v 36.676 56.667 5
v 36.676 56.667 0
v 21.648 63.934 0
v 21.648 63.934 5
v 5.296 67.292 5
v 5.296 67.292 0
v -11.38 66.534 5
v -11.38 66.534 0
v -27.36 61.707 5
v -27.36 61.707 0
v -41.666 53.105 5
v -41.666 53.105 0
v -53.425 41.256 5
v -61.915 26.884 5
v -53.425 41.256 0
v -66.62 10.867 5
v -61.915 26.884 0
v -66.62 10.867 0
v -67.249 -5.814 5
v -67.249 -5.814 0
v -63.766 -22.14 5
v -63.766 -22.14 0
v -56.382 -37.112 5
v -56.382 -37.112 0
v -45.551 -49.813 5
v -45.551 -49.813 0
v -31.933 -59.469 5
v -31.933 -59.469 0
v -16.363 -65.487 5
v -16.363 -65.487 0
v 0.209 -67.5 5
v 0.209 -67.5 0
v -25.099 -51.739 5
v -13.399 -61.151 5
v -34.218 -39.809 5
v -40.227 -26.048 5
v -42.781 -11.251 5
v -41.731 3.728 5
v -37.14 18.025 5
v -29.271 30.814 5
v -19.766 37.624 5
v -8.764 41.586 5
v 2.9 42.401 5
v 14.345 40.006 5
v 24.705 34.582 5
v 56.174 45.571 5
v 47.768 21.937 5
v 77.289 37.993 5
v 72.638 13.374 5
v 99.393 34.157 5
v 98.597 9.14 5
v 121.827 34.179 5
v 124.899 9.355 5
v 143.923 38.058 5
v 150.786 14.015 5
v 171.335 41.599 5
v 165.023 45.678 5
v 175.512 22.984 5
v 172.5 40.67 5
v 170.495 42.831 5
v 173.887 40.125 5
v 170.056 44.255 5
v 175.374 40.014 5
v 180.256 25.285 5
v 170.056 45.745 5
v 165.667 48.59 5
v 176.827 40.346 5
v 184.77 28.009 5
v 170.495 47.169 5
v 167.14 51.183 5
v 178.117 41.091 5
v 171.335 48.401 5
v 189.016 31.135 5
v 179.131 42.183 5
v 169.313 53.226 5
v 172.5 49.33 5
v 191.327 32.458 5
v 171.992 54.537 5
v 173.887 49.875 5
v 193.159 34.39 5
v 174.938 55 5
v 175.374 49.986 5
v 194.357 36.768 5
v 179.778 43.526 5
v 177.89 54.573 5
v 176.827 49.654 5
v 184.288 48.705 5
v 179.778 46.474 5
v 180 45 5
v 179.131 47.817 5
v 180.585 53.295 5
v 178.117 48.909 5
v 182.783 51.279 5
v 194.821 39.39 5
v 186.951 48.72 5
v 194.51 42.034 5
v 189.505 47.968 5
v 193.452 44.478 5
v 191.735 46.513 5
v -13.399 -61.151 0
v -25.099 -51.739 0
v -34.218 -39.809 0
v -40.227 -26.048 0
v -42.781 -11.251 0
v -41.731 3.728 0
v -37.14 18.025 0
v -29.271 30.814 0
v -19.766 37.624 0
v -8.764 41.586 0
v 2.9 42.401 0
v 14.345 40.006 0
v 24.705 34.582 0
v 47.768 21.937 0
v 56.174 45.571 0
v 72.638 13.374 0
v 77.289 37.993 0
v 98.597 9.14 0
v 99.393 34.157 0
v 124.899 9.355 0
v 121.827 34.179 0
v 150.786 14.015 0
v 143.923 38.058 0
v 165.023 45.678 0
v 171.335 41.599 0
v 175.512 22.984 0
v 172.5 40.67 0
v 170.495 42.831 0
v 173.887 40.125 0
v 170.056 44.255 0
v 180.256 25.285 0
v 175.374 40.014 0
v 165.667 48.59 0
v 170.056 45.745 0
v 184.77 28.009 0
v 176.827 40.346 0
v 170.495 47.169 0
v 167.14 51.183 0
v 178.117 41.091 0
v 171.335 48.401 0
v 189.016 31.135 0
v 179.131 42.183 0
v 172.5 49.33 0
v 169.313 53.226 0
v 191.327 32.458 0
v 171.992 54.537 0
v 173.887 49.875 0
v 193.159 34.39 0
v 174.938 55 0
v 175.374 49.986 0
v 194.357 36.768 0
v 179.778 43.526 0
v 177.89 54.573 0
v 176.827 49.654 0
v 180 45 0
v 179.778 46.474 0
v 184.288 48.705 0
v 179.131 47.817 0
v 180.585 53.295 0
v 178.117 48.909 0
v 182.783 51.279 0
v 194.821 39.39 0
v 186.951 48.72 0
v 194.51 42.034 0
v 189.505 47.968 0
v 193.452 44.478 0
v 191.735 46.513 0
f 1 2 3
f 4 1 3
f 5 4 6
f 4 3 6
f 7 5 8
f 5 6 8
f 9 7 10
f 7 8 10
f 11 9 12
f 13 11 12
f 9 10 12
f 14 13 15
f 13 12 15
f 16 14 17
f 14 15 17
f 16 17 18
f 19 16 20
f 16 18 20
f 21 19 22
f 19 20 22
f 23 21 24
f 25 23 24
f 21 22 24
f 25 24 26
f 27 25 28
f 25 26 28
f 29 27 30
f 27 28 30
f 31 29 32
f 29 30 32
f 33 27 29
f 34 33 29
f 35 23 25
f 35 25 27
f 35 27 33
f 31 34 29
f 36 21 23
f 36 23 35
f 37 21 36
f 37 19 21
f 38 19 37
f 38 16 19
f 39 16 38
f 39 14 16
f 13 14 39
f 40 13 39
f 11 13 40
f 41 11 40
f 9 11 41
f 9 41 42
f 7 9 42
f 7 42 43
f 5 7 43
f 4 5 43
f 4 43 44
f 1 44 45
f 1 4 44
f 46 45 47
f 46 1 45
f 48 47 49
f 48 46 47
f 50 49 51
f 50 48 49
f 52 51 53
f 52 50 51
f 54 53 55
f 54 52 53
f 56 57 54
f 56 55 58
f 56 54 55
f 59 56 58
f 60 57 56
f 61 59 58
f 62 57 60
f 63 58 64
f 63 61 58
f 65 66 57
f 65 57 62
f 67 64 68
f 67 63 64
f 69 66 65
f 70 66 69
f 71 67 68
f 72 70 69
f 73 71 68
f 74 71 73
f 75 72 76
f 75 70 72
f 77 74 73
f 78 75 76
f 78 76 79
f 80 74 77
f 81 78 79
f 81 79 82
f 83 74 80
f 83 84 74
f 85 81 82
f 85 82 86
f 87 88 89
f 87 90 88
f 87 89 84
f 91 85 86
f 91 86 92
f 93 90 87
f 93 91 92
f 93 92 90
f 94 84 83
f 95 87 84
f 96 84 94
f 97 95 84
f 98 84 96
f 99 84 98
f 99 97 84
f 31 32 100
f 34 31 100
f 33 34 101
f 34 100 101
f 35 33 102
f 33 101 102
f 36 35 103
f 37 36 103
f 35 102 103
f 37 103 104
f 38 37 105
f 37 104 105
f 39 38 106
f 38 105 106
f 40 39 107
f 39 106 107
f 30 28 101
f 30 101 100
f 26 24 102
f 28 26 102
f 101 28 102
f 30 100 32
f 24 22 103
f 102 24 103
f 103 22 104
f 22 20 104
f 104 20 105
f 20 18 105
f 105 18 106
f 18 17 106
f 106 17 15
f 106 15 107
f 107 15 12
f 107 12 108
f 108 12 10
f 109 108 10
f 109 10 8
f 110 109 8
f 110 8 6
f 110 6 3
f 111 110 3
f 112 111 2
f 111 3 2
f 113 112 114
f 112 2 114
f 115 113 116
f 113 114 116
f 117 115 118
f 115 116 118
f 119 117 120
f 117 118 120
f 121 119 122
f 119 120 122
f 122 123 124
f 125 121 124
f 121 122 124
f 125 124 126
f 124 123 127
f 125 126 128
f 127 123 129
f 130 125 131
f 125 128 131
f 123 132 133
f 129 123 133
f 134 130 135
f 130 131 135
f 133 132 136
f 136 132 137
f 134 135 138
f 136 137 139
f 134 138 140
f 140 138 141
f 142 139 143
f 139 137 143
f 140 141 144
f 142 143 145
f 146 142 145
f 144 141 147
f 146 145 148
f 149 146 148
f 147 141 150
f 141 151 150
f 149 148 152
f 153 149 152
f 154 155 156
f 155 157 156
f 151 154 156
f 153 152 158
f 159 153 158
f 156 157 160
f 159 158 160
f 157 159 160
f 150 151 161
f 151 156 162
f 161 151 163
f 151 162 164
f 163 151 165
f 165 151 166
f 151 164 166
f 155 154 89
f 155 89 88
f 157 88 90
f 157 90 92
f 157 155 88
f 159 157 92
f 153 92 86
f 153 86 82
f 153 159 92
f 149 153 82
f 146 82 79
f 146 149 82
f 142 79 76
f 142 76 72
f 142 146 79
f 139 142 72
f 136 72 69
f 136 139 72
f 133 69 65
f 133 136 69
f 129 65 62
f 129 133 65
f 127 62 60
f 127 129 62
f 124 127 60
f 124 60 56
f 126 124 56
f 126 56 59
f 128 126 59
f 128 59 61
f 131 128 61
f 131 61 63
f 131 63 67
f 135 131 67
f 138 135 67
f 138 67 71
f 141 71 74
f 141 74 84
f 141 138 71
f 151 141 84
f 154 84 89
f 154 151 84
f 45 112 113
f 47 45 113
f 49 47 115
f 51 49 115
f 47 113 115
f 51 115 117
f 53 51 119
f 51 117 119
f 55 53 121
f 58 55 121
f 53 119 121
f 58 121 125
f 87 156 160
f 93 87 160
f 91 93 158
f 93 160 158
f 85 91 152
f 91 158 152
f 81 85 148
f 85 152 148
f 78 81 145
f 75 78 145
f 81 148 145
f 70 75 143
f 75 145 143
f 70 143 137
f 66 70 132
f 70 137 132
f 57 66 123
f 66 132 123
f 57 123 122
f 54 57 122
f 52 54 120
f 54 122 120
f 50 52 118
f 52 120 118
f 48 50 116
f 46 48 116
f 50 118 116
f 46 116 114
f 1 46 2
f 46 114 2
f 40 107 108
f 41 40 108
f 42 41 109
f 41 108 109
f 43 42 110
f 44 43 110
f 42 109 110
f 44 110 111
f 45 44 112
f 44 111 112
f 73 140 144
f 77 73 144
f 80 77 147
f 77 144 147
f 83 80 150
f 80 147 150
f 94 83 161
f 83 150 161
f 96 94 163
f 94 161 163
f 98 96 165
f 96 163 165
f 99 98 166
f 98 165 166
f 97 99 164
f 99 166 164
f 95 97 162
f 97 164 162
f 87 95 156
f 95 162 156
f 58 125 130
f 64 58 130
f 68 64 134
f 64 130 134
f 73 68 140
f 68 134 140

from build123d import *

# Parameters (mm, degrees)
F0_R     = 5
F1_DEPTH = 5


with BuildPart() as f1:
    # F0 (on Top) → F1 (new body)
    with BuildSketch(Plane.XY):
        with BuildLine():
            ThreePointArc((165.022992, 45.677721), (99.392758, 34.157347), (36.67612, 56.666677))
            ThreePointArc((36.67612, 56.666677), (-64.76451, 19.021258), (0.208612, -67.499678))
            ThreePointArc((0.208612, -67.499678), (-40.226954, -26.047967), (-29.270659, 30.813609))
            ThreePointArc((-29.270659, 30.813609), (-2.960146, 42.396787), (24.704722, 34.582173))
            ThreePointArc((24.704722, 34.582173), (98.597431, 9.139806), (175.511513, 22.984309))
            ThreePointArc((175.511513, 22.984309), (182.544206, 26.59511), (189.016125, 31.135037))
            ThreePointArc((189.016125, 31.135037), (194.510373, 42.034346), (184.288439, 48.704713))
            ThreePointArc((184.288439, 48.704713), (173.447839, 54.878805), (165.022992, 45.677721))
        make_face()
        with Locations((175, 45)):
            Circle(F0_R, mode=Mode.SUBTRACT)
    extrude(amount=F1_DEPTH)


solid = f1.part
